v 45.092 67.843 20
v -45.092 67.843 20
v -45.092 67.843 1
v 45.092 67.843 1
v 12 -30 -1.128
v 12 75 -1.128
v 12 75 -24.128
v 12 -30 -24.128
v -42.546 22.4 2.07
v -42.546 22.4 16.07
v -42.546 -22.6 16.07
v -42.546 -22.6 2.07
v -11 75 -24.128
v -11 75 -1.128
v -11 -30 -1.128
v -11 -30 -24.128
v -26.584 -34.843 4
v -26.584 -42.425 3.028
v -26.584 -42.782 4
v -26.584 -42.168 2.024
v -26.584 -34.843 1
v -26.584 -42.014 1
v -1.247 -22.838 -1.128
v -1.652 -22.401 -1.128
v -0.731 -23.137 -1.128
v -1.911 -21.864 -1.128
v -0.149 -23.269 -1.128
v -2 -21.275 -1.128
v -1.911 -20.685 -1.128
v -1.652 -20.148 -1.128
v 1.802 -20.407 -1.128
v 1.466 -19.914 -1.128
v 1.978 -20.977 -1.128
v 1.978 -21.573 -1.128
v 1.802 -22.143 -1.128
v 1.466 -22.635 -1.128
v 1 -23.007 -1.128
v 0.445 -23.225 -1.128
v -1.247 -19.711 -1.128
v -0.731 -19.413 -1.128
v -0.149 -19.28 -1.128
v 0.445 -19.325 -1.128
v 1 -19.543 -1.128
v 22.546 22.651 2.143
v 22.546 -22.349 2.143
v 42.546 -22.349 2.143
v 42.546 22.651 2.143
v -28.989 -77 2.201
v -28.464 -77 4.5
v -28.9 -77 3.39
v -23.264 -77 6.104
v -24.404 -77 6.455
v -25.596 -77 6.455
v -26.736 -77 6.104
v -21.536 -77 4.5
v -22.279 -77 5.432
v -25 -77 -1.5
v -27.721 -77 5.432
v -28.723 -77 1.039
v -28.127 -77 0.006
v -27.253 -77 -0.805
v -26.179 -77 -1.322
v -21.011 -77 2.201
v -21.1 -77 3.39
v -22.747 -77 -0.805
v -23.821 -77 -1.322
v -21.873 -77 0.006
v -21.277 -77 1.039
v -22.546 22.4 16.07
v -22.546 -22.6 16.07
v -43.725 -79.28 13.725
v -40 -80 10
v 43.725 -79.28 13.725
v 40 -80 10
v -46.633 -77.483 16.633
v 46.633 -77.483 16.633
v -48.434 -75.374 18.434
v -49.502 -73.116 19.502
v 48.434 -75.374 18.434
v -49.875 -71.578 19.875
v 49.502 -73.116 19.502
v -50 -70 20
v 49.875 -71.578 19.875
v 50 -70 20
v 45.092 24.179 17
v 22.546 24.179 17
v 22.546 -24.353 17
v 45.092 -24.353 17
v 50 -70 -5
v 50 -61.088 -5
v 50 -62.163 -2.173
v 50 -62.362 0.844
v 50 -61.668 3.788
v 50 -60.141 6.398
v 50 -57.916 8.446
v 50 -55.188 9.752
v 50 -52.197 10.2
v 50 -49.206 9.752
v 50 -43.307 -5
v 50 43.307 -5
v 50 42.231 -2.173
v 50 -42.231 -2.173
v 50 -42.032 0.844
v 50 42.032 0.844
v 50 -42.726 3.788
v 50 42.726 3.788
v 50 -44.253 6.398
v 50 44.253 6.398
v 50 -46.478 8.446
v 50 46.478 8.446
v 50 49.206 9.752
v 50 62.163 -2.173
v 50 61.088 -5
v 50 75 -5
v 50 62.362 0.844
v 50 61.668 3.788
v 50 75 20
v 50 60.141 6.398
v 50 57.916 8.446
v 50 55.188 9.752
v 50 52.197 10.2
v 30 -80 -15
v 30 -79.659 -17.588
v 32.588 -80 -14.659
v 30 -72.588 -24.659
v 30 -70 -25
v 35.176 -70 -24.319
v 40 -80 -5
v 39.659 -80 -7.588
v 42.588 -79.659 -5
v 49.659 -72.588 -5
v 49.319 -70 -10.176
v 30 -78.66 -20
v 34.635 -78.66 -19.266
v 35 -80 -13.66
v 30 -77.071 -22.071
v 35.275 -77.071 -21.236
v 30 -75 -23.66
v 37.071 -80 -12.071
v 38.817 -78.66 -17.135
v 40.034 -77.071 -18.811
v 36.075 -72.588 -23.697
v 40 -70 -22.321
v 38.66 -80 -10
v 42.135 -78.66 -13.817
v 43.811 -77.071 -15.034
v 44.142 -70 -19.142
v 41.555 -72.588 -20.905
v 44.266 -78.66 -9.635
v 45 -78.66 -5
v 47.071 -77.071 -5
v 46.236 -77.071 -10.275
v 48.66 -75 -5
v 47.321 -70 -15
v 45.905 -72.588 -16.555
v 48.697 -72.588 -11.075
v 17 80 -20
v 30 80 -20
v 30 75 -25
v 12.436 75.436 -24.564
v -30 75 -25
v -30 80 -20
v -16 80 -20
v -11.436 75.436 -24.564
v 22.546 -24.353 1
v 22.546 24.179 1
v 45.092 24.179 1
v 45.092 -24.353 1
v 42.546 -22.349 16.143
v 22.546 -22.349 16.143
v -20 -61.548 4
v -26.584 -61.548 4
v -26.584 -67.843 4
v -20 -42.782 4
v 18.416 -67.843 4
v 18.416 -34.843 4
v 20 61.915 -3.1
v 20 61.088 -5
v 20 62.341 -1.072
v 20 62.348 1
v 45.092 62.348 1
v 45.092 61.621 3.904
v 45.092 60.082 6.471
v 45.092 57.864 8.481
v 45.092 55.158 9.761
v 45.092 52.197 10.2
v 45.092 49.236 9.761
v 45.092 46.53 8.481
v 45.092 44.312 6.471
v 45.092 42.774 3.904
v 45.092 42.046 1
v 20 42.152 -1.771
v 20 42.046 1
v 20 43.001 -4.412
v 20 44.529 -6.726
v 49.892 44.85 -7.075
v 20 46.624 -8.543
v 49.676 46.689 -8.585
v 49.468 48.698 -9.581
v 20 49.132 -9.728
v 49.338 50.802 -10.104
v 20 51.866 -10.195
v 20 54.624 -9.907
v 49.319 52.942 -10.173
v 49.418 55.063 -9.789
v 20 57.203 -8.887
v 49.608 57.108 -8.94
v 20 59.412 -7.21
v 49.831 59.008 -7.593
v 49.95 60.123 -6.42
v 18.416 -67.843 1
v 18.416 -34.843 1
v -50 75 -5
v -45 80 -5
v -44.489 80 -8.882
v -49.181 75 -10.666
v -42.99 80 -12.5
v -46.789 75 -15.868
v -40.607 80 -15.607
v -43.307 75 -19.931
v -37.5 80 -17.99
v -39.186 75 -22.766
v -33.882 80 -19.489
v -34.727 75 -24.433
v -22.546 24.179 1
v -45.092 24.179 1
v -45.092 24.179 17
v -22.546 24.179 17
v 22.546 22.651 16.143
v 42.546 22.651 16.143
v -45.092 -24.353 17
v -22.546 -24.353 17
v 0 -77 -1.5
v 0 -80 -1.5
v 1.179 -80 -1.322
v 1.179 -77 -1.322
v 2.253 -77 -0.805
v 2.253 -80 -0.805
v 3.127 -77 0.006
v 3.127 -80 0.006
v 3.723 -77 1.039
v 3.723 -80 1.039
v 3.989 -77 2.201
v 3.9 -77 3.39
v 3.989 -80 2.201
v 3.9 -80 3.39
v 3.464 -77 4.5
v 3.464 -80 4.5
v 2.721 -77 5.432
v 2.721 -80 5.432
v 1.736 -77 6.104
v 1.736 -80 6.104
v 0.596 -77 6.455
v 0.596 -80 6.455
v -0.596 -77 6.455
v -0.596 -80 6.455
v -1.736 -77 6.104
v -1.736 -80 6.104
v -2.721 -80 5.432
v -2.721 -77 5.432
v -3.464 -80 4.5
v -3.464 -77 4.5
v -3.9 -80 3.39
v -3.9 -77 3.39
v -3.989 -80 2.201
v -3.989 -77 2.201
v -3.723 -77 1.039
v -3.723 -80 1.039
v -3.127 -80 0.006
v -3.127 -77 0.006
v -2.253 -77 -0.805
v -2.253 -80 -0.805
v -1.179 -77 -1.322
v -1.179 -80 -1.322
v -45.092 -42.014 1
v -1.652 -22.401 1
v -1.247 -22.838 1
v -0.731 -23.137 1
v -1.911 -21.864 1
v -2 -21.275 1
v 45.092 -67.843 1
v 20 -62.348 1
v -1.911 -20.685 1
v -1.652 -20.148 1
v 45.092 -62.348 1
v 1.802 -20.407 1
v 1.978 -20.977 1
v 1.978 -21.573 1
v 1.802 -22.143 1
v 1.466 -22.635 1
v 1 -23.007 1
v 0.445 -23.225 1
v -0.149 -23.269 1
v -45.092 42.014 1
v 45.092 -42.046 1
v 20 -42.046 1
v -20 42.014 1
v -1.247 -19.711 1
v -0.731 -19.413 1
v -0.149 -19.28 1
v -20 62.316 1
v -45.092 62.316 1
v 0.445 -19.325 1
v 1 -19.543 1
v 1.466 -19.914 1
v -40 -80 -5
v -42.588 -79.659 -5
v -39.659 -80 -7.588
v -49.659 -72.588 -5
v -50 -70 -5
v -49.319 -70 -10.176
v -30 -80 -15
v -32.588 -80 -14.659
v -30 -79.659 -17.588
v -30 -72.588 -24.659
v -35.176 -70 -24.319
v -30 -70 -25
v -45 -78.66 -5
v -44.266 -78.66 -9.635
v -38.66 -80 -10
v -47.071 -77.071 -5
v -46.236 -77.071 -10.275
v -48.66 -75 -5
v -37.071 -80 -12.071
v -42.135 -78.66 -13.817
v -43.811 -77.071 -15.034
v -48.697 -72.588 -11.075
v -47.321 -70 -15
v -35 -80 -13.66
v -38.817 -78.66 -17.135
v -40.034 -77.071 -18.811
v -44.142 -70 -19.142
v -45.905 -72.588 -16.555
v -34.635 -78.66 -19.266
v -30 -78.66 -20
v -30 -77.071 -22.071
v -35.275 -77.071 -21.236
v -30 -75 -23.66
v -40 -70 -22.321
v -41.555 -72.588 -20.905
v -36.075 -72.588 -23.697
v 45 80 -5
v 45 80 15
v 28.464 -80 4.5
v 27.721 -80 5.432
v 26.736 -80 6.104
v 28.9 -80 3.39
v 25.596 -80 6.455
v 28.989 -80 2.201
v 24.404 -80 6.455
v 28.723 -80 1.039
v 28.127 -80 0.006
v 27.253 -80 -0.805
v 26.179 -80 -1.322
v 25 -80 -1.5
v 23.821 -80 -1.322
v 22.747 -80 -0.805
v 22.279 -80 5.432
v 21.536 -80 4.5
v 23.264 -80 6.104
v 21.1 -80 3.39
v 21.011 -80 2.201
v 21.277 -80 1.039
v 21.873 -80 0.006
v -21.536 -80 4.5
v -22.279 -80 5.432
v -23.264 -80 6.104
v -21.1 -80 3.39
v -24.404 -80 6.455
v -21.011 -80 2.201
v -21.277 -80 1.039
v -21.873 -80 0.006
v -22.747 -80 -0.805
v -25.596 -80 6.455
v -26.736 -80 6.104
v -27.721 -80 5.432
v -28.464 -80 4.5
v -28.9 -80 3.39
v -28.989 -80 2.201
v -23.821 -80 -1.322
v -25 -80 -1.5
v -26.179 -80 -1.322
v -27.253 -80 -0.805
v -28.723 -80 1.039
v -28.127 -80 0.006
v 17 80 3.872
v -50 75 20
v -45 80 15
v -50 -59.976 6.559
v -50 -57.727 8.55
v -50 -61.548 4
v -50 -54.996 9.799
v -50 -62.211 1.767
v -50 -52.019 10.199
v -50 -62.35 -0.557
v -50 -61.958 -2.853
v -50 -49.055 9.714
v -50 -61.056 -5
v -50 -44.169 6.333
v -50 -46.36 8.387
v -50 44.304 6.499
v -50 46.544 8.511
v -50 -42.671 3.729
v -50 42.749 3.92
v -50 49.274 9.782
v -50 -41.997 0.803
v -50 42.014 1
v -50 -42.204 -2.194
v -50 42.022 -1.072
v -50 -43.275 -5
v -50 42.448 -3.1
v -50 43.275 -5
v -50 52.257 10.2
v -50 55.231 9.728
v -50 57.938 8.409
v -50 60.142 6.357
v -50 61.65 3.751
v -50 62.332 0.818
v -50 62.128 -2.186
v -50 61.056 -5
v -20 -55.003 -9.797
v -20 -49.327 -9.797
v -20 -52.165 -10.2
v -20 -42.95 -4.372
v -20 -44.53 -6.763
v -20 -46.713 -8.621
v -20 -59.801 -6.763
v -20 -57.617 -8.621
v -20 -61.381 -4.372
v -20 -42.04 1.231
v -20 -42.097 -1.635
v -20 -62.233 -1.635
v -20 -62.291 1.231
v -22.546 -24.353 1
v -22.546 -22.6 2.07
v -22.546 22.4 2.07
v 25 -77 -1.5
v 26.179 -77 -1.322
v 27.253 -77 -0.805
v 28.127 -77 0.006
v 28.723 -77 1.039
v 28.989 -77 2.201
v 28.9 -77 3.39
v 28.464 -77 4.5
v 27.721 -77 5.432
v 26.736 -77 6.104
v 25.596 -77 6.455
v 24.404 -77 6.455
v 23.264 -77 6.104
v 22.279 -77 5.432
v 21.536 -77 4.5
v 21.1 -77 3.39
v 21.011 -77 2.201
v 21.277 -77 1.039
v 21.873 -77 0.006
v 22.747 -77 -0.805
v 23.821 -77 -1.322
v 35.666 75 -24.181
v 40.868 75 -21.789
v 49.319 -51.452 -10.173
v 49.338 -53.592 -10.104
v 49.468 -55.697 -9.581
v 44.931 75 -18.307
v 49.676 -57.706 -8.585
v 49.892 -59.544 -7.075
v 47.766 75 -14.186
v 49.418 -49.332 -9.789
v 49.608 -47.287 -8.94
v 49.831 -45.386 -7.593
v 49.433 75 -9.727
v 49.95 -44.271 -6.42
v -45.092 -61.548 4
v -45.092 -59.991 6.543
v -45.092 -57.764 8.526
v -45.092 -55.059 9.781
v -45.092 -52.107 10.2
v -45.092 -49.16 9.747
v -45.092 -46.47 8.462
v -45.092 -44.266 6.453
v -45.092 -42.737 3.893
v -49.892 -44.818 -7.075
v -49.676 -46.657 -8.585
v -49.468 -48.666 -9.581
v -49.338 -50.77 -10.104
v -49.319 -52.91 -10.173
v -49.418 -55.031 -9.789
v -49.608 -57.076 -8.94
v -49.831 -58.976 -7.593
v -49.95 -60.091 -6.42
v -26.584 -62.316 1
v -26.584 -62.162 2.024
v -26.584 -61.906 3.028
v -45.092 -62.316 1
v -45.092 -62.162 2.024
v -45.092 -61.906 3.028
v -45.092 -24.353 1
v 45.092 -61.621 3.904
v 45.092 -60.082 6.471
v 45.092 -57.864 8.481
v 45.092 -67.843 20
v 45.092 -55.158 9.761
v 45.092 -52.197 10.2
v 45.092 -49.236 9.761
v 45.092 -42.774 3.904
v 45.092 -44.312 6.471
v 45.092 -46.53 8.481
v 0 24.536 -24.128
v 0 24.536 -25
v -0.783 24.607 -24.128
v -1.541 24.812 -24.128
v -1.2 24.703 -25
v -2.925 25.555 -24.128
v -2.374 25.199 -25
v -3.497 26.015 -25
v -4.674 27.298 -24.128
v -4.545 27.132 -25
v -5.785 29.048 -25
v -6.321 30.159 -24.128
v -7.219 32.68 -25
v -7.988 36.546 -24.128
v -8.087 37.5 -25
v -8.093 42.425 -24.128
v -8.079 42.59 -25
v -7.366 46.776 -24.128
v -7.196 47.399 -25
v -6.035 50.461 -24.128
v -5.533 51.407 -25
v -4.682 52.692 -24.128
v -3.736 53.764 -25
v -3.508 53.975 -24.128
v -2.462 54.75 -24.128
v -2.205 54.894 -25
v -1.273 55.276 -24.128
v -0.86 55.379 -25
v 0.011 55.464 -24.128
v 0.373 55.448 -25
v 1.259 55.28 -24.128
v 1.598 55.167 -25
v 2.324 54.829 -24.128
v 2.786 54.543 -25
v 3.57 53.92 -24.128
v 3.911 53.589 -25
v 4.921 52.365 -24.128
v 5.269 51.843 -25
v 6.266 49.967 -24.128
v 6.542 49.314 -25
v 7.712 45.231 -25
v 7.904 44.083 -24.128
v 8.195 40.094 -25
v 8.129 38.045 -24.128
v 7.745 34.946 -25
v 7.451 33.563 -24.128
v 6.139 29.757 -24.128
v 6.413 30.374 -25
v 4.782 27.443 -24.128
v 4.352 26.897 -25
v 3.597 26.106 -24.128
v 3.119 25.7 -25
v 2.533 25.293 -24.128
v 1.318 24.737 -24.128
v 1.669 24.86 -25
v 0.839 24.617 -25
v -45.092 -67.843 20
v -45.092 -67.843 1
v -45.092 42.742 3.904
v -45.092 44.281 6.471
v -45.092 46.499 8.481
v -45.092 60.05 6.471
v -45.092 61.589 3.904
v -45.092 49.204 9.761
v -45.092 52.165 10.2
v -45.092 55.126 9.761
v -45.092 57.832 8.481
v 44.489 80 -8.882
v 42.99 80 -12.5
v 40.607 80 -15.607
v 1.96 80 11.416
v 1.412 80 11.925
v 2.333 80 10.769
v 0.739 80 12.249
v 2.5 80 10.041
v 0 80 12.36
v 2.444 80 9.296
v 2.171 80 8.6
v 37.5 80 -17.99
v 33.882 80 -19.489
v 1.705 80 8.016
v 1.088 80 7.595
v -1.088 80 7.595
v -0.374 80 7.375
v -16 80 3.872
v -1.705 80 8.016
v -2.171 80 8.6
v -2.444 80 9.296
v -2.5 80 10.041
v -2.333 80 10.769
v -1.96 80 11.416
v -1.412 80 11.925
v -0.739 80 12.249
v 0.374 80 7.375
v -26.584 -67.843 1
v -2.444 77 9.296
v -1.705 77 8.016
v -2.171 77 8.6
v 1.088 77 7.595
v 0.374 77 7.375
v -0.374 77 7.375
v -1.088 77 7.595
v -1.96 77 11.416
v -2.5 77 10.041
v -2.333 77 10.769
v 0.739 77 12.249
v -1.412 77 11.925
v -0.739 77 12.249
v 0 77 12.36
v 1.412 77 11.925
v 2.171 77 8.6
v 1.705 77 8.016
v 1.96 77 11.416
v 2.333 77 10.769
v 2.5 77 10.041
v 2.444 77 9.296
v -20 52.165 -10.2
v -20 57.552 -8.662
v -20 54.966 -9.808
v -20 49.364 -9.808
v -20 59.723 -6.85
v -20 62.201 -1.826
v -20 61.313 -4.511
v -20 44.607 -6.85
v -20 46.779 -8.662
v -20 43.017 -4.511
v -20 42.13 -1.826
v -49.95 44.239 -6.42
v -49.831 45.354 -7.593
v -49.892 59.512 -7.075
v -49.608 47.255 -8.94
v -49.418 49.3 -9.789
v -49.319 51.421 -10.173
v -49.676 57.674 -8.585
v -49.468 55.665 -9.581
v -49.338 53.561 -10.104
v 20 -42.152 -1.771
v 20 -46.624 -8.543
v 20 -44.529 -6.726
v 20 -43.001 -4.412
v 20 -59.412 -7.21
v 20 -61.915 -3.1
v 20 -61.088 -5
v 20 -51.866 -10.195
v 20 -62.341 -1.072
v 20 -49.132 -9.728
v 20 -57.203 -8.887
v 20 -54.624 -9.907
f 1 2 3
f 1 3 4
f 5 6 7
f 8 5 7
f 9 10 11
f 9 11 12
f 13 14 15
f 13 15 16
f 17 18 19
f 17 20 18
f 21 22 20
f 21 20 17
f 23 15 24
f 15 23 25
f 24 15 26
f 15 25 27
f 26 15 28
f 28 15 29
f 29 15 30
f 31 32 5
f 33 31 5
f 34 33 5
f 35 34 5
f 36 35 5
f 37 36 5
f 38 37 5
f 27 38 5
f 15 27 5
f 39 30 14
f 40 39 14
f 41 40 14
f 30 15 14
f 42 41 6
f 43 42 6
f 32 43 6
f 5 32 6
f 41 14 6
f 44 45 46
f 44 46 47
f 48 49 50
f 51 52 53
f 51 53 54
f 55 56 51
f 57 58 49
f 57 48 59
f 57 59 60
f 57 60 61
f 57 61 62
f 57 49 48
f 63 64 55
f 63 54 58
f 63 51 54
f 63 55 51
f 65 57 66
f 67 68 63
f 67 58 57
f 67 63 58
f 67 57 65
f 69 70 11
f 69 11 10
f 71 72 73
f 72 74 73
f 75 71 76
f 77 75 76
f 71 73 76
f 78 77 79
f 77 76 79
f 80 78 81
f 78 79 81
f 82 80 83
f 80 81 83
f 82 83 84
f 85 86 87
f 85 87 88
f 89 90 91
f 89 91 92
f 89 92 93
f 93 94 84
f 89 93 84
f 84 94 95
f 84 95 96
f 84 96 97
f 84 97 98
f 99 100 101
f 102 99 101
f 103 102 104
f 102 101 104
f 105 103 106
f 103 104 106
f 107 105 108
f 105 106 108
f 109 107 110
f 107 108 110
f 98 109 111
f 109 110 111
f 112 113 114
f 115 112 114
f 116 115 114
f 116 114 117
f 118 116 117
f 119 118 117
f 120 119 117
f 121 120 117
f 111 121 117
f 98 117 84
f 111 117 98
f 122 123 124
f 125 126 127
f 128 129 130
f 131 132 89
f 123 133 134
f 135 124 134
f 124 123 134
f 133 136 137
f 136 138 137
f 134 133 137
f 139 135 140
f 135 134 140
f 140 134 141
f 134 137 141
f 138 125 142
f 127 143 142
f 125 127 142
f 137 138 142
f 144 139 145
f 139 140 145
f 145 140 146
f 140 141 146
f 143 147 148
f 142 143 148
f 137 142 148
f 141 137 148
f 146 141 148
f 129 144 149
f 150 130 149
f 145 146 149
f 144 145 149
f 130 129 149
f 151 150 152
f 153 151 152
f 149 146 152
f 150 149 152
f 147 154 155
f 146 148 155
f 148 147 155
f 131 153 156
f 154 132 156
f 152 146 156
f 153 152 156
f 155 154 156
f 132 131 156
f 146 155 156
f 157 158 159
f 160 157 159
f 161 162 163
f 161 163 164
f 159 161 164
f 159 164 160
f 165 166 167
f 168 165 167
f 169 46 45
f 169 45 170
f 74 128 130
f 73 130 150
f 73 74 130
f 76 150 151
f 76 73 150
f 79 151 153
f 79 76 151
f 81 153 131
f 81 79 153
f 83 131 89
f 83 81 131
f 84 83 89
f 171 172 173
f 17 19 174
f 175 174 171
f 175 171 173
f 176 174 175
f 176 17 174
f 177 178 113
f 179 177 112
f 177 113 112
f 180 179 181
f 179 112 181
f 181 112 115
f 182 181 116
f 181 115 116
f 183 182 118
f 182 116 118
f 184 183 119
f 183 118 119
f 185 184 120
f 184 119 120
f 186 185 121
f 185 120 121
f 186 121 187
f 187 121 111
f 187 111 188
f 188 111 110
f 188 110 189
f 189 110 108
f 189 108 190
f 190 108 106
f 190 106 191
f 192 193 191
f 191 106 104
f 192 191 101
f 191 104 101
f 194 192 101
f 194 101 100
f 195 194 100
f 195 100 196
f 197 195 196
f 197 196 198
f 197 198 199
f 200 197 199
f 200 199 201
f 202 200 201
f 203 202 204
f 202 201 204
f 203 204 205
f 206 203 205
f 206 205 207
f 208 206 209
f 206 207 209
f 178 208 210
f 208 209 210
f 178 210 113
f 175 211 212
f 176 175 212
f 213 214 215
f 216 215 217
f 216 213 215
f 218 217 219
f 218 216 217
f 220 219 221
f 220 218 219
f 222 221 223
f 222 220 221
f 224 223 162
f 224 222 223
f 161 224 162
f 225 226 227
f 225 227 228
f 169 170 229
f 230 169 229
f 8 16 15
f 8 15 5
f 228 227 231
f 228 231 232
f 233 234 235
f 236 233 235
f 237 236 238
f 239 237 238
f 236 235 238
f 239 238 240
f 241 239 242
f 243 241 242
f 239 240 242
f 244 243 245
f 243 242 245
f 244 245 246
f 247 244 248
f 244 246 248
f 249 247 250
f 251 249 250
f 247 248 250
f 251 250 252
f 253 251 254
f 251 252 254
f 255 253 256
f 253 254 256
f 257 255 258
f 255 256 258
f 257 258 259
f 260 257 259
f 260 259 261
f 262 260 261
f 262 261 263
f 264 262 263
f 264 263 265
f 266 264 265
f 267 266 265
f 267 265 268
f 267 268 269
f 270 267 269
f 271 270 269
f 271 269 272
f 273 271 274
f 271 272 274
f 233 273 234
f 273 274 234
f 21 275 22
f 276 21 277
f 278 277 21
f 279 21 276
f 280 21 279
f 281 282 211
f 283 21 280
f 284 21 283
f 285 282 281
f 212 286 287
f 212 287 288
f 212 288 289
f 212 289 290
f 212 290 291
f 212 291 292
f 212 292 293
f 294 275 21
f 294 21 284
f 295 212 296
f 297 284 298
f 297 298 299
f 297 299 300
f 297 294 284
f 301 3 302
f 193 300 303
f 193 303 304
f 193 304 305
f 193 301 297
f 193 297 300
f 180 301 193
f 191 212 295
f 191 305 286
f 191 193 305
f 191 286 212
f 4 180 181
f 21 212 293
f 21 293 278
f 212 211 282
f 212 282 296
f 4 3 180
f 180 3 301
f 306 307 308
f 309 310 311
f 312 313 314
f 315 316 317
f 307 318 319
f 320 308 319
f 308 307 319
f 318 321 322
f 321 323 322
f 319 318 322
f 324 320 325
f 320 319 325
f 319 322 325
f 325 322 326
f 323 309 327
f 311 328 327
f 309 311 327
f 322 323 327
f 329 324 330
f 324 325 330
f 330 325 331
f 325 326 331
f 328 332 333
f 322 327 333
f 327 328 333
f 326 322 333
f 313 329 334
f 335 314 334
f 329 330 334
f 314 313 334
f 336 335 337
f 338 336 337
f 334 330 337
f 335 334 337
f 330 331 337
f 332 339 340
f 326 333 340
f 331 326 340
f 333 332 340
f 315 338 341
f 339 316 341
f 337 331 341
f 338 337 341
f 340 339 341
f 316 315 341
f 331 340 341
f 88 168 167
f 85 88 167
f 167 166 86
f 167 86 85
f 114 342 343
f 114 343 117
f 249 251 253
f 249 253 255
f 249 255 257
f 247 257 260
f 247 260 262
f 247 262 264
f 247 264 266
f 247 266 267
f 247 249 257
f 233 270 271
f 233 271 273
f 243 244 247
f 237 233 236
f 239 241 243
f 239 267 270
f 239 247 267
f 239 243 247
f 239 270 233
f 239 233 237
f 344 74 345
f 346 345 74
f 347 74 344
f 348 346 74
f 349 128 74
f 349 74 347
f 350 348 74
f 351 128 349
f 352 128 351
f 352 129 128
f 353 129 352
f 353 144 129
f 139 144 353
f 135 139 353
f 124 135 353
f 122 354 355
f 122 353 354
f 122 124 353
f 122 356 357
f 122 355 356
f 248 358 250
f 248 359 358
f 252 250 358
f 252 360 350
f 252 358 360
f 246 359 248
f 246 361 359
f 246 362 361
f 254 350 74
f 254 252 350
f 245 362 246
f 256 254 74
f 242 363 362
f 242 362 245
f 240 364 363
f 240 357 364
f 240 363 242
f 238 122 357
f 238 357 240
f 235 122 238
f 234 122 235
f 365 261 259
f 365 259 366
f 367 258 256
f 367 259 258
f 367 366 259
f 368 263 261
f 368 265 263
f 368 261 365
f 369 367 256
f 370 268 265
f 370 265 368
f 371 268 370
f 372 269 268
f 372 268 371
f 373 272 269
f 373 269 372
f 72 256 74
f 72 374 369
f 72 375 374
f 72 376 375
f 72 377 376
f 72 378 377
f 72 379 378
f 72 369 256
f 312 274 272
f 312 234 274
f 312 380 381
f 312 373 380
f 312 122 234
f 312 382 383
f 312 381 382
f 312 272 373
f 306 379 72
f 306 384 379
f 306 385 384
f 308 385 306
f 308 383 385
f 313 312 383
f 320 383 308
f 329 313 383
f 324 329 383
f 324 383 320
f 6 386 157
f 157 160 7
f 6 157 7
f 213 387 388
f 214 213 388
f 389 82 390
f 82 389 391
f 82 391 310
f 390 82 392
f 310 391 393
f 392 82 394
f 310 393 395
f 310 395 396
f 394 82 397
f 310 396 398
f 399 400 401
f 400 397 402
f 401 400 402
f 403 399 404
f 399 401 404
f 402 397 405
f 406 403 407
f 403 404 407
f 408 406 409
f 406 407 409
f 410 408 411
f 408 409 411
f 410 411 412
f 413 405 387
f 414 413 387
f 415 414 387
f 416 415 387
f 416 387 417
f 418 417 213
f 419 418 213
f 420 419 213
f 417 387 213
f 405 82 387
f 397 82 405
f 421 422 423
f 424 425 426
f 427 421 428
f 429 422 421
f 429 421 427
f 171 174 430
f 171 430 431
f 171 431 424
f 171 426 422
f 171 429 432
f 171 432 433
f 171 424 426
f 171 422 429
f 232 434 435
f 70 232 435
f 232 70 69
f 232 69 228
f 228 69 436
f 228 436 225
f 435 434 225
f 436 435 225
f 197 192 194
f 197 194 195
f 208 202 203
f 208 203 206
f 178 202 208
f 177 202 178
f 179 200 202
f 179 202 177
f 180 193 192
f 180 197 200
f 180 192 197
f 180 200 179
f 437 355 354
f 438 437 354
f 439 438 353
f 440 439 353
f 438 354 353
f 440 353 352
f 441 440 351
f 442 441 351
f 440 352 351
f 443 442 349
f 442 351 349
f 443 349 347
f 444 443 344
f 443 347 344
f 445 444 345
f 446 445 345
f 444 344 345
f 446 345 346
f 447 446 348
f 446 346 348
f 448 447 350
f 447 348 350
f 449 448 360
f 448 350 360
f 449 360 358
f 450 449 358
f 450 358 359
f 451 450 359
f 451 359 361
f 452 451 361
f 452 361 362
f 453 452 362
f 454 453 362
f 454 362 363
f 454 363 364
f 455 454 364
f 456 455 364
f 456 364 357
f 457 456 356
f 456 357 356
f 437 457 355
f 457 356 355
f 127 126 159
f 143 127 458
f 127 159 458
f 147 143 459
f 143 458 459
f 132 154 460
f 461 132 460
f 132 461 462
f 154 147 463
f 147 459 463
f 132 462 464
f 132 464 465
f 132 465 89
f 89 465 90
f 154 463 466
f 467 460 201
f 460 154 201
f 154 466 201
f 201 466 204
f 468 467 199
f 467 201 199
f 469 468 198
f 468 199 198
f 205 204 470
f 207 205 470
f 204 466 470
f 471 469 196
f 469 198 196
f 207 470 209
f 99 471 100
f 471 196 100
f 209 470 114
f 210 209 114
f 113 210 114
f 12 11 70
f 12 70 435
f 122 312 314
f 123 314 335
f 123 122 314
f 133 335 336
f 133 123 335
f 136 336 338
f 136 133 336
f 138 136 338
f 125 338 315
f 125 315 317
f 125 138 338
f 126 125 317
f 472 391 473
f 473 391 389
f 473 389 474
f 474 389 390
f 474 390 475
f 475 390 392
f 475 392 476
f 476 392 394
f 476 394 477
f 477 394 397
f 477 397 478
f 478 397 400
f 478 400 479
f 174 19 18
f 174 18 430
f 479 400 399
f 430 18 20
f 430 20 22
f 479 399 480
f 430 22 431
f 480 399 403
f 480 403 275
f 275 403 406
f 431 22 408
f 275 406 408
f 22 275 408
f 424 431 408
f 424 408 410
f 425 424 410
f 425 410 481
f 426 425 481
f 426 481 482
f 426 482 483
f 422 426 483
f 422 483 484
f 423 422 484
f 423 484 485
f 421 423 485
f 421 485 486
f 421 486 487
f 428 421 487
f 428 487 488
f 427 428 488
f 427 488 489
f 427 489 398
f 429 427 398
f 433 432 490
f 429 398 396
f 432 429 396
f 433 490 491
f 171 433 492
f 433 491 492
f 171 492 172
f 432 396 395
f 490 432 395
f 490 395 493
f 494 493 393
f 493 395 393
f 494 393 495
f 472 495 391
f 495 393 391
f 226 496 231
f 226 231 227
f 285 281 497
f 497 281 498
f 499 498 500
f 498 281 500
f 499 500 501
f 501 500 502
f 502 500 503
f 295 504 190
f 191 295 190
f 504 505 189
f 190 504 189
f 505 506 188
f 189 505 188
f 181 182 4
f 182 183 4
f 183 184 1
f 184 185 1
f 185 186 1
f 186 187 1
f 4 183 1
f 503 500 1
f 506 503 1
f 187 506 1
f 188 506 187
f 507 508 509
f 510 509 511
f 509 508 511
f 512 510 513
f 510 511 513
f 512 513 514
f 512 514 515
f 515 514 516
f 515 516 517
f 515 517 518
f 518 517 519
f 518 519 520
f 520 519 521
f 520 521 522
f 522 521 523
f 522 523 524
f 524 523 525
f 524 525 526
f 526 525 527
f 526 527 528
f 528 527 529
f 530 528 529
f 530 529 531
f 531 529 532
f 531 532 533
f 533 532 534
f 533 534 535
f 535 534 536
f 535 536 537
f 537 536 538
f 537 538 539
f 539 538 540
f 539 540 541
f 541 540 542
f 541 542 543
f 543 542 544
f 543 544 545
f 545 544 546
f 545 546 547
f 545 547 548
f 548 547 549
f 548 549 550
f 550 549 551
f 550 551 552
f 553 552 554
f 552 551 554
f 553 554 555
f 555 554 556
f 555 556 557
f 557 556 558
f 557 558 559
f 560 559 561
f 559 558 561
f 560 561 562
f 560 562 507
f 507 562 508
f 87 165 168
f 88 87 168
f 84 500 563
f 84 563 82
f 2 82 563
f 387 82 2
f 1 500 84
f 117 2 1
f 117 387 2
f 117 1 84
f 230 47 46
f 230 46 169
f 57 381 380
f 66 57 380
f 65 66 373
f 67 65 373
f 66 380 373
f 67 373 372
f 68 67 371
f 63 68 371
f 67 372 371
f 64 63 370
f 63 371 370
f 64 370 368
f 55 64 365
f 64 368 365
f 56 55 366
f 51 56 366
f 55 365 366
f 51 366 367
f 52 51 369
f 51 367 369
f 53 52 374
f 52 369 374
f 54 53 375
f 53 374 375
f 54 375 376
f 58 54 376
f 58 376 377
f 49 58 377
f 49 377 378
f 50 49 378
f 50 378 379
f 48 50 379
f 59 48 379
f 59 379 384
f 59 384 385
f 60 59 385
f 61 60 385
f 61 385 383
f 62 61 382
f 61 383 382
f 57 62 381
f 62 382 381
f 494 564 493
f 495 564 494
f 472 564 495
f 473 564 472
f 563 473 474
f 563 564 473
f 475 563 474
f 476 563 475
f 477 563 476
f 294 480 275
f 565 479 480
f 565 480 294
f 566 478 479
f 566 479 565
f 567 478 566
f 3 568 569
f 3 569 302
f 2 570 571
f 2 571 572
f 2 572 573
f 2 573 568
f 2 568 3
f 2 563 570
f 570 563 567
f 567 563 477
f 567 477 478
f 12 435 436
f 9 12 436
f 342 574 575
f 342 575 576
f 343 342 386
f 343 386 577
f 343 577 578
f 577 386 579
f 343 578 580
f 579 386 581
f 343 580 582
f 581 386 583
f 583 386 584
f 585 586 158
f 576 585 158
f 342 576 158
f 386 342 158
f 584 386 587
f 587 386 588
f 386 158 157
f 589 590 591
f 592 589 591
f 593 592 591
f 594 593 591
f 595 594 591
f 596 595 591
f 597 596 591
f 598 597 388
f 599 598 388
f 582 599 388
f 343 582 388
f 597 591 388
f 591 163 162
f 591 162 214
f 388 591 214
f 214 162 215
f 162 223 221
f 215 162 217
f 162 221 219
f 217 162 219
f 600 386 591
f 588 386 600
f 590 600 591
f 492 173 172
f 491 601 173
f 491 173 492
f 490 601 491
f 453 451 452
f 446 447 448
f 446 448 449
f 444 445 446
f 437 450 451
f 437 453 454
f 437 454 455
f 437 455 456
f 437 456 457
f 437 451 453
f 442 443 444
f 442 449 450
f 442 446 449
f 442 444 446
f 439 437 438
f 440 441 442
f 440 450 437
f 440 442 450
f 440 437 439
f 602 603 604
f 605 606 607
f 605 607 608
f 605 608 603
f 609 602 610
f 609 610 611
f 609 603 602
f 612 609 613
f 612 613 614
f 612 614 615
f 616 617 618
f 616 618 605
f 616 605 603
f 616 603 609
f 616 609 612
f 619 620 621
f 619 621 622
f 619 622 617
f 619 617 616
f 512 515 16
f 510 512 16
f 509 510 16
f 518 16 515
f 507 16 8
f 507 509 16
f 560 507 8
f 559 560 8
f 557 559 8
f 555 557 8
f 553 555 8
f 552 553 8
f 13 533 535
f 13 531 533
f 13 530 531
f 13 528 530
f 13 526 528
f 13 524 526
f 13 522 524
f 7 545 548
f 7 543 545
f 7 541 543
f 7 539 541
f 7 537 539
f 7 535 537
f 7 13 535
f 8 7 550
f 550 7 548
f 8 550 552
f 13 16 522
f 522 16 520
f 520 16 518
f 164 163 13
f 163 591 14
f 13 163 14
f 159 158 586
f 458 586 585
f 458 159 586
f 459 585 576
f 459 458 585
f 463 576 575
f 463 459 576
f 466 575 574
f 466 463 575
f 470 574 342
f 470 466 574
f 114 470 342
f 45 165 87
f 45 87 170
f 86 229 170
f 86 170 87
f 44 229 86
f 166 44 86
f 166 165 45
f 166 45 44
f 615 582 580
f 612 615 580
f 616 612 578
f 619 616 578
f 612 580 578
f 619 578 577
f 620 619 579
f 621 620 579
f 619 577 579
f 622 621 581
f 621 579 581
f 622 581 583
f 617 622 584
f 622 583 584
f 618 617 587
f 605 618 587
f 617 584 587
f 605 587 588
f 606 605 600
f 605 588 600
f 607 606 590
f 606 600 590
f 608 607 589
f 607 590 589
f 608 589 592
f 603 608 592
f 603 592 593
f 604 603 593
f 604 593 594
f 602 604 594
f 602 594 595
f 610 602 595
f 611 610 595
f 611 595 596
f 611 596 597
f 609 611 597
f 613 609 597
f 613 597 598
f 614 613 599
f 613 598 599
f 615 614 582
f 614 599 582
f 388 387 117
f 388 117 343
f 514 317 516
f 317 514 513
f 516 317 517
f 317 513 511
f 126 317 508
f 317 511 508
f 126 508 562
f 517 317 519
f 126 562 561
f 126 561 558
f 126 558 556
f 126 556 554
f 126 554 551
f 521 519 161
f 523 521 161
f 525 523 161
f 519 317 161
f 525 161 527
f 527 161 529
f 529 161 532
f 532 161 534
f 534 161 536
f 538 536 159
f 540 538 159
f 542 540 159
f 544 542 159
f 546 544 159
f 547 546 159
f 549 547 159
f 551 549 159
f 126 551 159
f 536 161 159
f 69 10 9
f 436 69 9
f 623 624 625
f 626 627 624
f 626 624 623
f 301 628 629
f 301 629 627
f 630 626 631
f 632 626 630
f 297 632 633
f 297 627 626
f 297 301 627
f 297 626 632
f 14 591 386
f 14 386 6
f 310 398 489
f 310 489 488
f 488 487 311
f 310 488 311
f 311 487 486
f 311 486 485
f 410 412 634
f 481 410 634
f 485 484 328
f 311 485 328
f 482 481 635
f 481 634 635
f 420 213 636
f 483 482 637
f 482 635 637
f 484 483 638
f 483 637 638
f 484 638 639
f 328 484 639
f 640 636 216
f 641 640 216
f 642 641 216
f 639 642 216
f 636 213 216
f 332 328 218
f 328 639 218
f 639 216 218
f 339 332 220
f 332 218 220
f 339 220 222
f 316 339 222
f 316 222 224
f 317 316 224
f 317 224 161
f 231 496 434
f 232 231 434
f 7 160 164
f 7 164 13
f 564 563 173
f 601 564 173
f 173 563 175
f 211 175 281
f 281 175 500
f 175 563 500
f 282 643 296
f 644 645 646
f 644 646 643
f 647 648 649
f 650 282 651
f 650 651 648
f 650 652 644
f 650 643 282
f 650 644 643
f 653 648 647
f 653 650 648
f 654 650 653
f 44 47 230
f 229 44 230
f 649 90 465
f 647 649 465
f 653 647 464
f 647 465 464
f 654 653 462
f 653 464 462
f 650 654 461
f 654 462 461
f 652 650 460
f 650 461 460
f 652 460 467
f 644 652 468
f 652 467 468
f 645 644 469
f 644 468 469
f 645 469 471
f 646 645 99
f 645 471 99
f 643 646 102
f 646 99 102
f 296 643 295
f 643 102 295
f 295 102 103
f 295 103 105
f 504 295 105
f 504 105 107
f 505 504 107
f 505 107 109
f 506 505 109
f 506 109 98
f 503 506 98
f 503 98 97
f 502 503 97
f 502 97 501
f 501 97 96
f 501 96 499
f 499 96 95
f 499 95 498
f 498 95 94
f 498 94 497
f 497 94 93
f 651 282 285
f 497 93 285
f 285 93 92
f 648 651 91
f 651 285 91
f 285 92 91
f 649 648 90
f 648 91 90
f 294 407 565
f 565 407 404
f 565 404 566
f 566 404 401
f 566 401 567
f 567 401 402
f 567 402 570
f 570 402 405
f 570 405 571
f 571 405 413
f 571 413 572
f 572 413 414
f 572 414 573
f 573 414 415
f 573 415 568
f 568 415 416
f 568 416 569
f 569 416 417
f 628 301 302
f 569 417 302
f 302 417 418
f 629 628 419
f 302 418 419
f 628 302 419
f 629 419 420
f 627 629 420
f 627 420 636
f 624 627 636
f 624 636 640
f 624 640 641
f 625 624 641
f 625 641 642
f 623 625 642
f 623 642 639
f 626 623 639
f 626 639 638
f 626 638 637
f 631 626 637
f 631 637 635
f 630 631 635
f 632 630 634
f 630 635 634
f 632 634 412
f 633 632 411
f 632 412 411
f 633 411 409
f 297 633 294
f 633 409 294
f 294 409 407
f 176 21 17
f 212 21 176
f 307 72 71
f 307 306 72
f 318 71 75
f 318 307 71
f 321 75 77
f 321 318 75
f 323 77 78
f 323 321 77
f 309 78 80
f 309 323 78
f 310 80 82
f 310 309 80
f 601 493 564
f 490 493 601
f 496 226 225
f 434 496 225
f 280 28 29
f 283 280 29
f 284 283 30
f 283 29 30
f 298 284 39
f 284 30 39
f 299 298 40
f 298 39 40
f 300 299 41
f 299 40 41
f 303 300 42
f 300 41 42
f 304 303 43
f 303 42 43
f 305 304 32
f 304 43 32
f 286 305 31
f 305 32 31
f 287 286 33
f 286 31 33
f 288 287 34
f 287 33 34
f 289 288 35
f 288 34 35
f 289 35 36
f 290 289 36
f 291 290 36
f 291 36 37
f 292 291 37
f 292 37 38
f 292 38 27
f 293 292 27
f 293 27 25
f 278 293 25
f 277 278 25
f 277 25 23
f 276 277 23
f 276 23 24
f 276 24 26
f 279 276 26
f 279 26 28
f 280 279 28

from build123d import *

# Parameters (mm, degrees)
SKETCH1_W             = 100
SKETCH1_H             = 160
BOSS_EXTRUDE1_DEPTH   = 20
BOSS_EXTRUDE2_DEPTH   = 160
FILLET4_R             = 10
SKETCH11_W            = 90.184018432
SKETCH11_H            = 135.686144012
CUT_EXTRUDE3_DEPTH    = 19
SKETCH12_W            = 23
SKETCH12_H            = 23
CUT_EXTRUDE4_DEPTH    = 110
SKETCH13_RX           = 15.4640355
SKETCH13_RY           = 8.1946903
CUT_EXTRUDE5_DEPTH    = 4
SKETCH15_R            = 2
CUT_EXTRUDE6_DEPTH    = 4
SKETCH22_W            = 22.546004608
SKETCH22_H            = 48.532413032
BOSS_EXTRUDE7_DEPTH   = 16
BOSS_EXTRUDE7_2_DEPTH = 16
SKETCH26_W            = 45
SKETCH26_H            = 33
BOSS_EXTRUDE8_DEPTH   = 3
SKETCH27_R            = 4
CUT_EXTRUDE13_DEPTH   = 3
SKETCH28_R            = 2.506731261
CUT_EXTRUDE14_DEPTH   = 3
SKETCH14_R            = 10.2
CUT_EXTRUDE15_DEPTH   = 30
SKETCH17_R            = 10.2
CUT_EXTRUDE16_DEPTH   = 30
SKETCH23_W            = 14
SKETCH23_H            = 45
CUT_EXTRUDE17_DEPTH   = 20
SKETCH24_W            = 14
SKETCH24_H            = 45
CUT_EXTRUDE18_DEPTH   = 20


with BuildPart() as part:
    # Sketch1 → Boss-Extrude1 (new body)
    with BuildSketch(Plane.XY):
        Rectangle(SKETCH1_W, SKETCH1_H)
    extrude(amount=BOSS_EXTRUDE1_DEPTH)

    # Sketch5 → Boss-Extrude2 (add)
    with BuildSketch(Plane(origin=(0, 80, 0), x_dir=(1, 0, 0), z_dir=(0, 1, 0))):
        with BuildLine():
            Line((50, 0), (-50, 0))
            Line((-50, 0), (-50, 5))
            ThreePointArc((-50, 5), (-44.142135624, 19.142135624), (-30, 25))
            Line((-30, 25), (30, 25))
            ThreePointArc((30, 25), (44.142135624, 19.142135624), (50, 5))
            Line((50, 5), (50, 0))
        make_face()
    extrude(amount=-BOSS_EXTRUDE2_DEPTH)

    # Fillet4
    fillet4_edges = [part.edges().sort_by_distance(p)[0] for p in [
        (-44.142135624, -80, -19.142135624),
        (0, -80, -25),
        (44.142135624, -80, -19.142135624),
        (0, -80, 20),
        (50, -80, 7.5),
        (-50, -80, 7.5),
    ]]
    fillet(fillet4_edges, radius=FILLET4_R)

    # Sketch11 → Cut-Extrude3 (cut)
    with BuildSketch(Plane.XY.offset(20)):
        Rectangle(SKETCH11_W, SKETCH11_H)
    extrude(amount=-CUT_EXTRUDE3_DEPTH, mode=Mode.SUBTRACT)

    # Sketch12 → Cut-Extrude4 (cut)
    with BuildSketch(Plane(origin=(0, 80, 0), x_dir=(1, 0, 0), z_dir=(0, 1, 0))):
        with Locations((0.5, 12.627685957)):
            Rectangle(SKETCH12_W, SKETCH12_H)
    extrude(amount=-CUT_EXTRUDE4_DEPTH, mode=Mode.SUBTRACT)

    # Sketch13 → Cut-Extrude5 (cut)
    with BuildSketch(Plane(origin=(0, 0, -25), x_dir=(-1, 0, 0), z_dir=(0, 0, -1))):
        with Locations(Location((0, 40), (0, 0, -90))):
            Ellipse(SKETCH13_RX, SKETCH13_RY)
    extrude(amount=-CUT_EXTRUDE5_DEPTH, mode=Mode.SUBTRACT)

    # Sketch15 → Cut-Extrude6 (cut)
    with BuildSketch(Plane(origin=(0, 0, -1.127685957), x_dir=(-1, 0, 0), z_dir=(0, 0, -1))):
        with Locations((0, -21.274761421)):
            Circle(SKETCH15_R)
    extrude(amount=-CUT_EXTRUDE6_DEPTH, mode=Mode.SUBTRACT)

    # Chamfer1
    # the kernel refuses this chamfer: 5 mm, written as the material it takes off along each edge
    with BuildSketch(Plane(origin=(30, 80, -5), x_dir=(0, 0, -1), z_dir=(-1, 0, 0))) as chamfer1_piece_1:
        with BuildLine():
            Line((14.858578644, -0.141421356), (20.141421356, 5.141421356))
            Line((20.141421356, 5.141421356), (20.241421356, 5.141421356))
            ThreePointArc((20.241421356, 5.141421356), (20.1, 2.570710678), (20.1, 0))
            Line((20.1, 0), (20, -0.1))
            ThreePointArc((20, -0.1), (17.429289322, -0.1), (14.858578644, -0.241421356))
            Line((14.858578644, -0.241421356), (14.858578644, -0.141421356))
        make_face()
    revolve(axis=Axis((30, 80, -5), (0, -1, 0)), revolution_arc=90, mode=Mode.SUBTRACT)
    with BuildSketch(Plane(origin=(-30, 80, -25), x_dir=(0, 0.0274958766105877, 0.9996219169112968), z_dir=(1, 0, 0))) as chamfer1_piece_2:
        with BuildLine():
            Line((5.143365976, 0), (-0.282735774, 5.135588968))
            Line((-0.282735774, 5.135588968), (-0.382697966, 5.13283938))
            ThreePointArc((-0.382697966, 5.13283938), (-0.170646135, 2.566989148), (-0.099962192, -0.002749588))
            Line((-0.099962192, -0.002749588), (0.002749588, -0.099962192))
            ThreePointArc((0.002749588, -0.099962192), (2.572488324, -0.029278248), (5.146115564, -0.099962192))
            Line((5.146115564, -0.099962192), (5.143365976, 0))
        make_face()
    extrude(amount=60, mode=Mode.SUBTRACT)
    with BuildSketch(Plane(origin=(-30, 80, -5), x_dir=(-1, 0, 0), z_dir=(0, 0, 1))) as chamfer1_piece_3:
        with BuildLine():
            Line((14.858578644, -0.141421356), (20.141421356, 5.141421356))
            Line((20.141421356, 5.141421356), (20.241421356, 5.141421356))
            ThreePointArc((20.241421356, 5.141421356), (20.1, 2.570710678), (20.1, 0))
            Line((20.1, 0), (20, -0.1))
            ThreePointArc((20, -0.1), (17.429289322, -0.1), (14.858578644, -0.241421356))
            Line((14.858578644, -0.241421356), (14.858578644, -0.141421356))
        make_face()
    revolve(axis=Axis((-30, 80, -5), (0, -1, 0)), revolution_arc=90, mode=Mode.SUBTRACT)
    with BuildSketch(Plane(origin=(12, 80, -1.127685957), x_dir=(0, 0.0274958766105877, 0.9996219169112968), z_dir=(-1, 0, 0)), Plane(origin=(-11, 80, -1.127685957), x_dir=(-0.9996219169112968, 0.0274958766105877, 0), z_dir=(0, 0, -1)), Plane(origin=(12, 80, -24.127685957), x_dir=(0.9996219169112965, 0.027495876610587732, 0), z_dir=(0, 0, 1)), Plane(origin=(-11, 80, -24.127685957), x_dir=(0, 0.0274958766105877, -0.9996219169112968), z_dir=(1, 0, 0))) as chamfer1_piece_4:
        with BuildLine():
            Line((5.143365976, 0), (-0.282735774, -5.135588968))
            Line((-0.282735774, -5.135588968), (-0.382697966, -5.13283938))
            ThreePointArc((-0.382697966, -5.13283938), (-0.170646135, -2.566989148), (-0.099962192, 0.002749588))
            Line((-0.099962192, 0.002749588), (0.002749588, 0.099962192))
            ThreePointArc((0.002749588, 0.099962192), (2.572488324, 0.029278248), (5.146115564, 0.099962192))
            Line((5.146115564, 0.099962192), (5.143365976, 0))
        make_face()
    extrude(amount=23, mode=Mode.SUBTRACT)
    with BuildSketch(Plane(origin=(-50, 80, -5), x_dir=(-0.027495876610586282, -0.9996219169112968, 0), z_dir=(0, 0, 1))) as chamfer1_piece_5:
        with BuildLine():
            Line((5.143365976, 0), (-0.282735774, 5.135588968))
            Line((-0.282735774, 5.135588968), (-0.382697966, 5.13283938))
            ThreePointArc((-0.382697966, 5.13283938), (-0.170646135, 2.566989148), (-0.099962192, -0.002749588))
            Line((-0.099962192, -0.002749588), (0.002749588, -0.099962192))
            ThreePointArc((0.002749588, -0.099962192), (2.572488324, -0.029278248), (5.146115564, -0.099962192))
            Line((5.146115564, -0.099962192), (5.143365976, 0))
        make_face()
    extrude(amount=25, mode=Mode.SUBTRACT)
    with BuildSketch(Plane(origin=(50, 80, 20), x_dir=(-0.9996219169112968, 0.0274958766105877, 0), z_dir=(0, 0, -1))) as chamfer1_piece_6:
        with BuildLine():
            Line((5.143365976, 0), (-0.282735774, -5.135588968))
            Line((-0.282735774, -5.135588968), (-0.382697966, -5.13283938))
            ThreePointArc((-0.382697966, -5.13283938), (-0.170646135, -2.566989148), (-0.099962192, 0.002749588))
            Line((-0.099962192, 0.002749588), (0.002749588, 0.099962192))
            ThreePointArc((0.002749588, 0.099962192), (2.572488324, 0.029278248), (5.146115564, 0.099962192))
            Line((5.146115564, 0.099962192), (5.143365976, 0))
        make_face()
    extrude(amount=25, mode=Mode.SUBTRACT)
    with BuildSketch(Plane(origin=(-50, 80, 20), x_dir=(0, -0.9996219169112968, 0.027495876610586282), z_dir=(1, 0, 0))) as chamfer1_piece_7:
        with BuildLine():
            Line((5.143365976, 0), (-0.282735774, 5.135588968))
            Line((-0.282735774, 5.135588968), (-0.382697966, 5.13283938))
            ThreePointArc((-0.382697966, 5.13283938), (-0.170646135, 2.566989148), (-0.099962192, -0.002749588))
            Line((-0.099962192, -0.002749588), (0.002749588, -0.099962192))
            ThreePointArc((0.002749588, -0.099962192), (2.572488324, -0.029278248), (5.146115564, -0.099962192))
            Line((5.146115564, -0.099962192), (5.143365976, 0))
        make_face()
    extrude(amount=100, mode=Mode.SUBTRACT)
    with BuildSketch(Plane(origin=(12, 80, -24.127685957), x_dir=(0.9996219169112965, 0.027495876610587732, 0), z_dir=(0, 0, 1))) as chamfer1_piece_8a_section:
        with BuildLine():
            Line((5.143365976, 0), (-0.282735774, -5.135588968))
            Line((-0.282735774, -5.135588968), (-0.382697966, -5.13283938))
            ThreePointArc((-0.382697966, -5.13283938), (-0.170646135, -2.566989148), (-0.099962192, 0.002749588))
            Line((-0.099962192, 0.002749588), (0.002749588, 0.099962192))
            ThreePointArc((0.002749588, 0.099962192), (2.572488324, 0.029278248), (5.146115564, 0.099962192))
            Line((5.146115564, 0.099962192), (5.143365976, 0))
        make_face()
    chamfer1_piece_8a = extrude(amount=35.85841494, mode=Mode.PRIVATE)
    chamfer1_piece_8a = split(chamfer1_piece_8a, bisect_by=Plane(origin=(13.648968134, 78.351031866, -1.127685957), z_dir=(0, 0, 1)), keep=Keep.TOP, mode=Mode.PRIVATE)
    with BuildSketch(Plane(origin=(24.85841494, 80, -1.127685957), x_dir=(0, 0.0274958766105877, 0.9996219169112968), z_dir=(-1, 0, 0))) as chamfer1_piece_8b_section:
        with BuildLine():
            Line((5.143365976, 0), (-0.282735774, -5.135588968))
            Line((-0.282735774, -5.135588968), (-0.382697966, -5.13283938))
            ThreePointArc((-0.382697966, -5.13283938), (-0.170646135, -2.566989148), (-0.099962192, 0.002749588))
            Line((-0.099962192, 0.002749588), (0.002749588, 0.099962192))
            ThreePointArc((0.002749588, 0.099962192), (2.572488324, 0.029278248), (5.146115564, 0.099962192))
            Line((5.146115564, 0.099962192), (5.143365976, 0))
        make_face()
    chamfer1_piece_8b = extrude(amount=35.85841494, mode=Mode.PRIVATE)
    chamfer1_piece_8b = split(chamfer1_piece_8b, bisect_by=Plane(origin=(12, 78.351031866, 0.521282178), z_dir=(1, 0, 0)), keep=Keep.TOP, mode=Mode.PRIVATE)
    chamfer1_piece_8 = chamfer1_piece_8a & chamfer1_piece_8b
    add(chamfer1_piece_8, mode=Mode.SUBTRACT)
    with BuildSketch(Plane(origin=(-11, 80, 11.730728983), x_dir=(-0.9996219169112968, 0.0274958766105877, 0), z_dir=(0, 0, -1))) as chamfer1_piece_9a_section:
        with BuildLine():
            Line((5.143365976, 0), (-0.282735774, -5.135588968))
            Line((-0.282735774, -5.135588968), (-0.382697966, -5.13283938))
            ThreePointArc((-0.382697966, -5.13283938), (-0.170646135, -2.566989148), (-0.099962192, 0.002749588))
            Line((-0.099962192, 0.002749588), (0.002749588, 0.099962192))
            ThreePointArc((0.002749588, 0.099962192), (2.572488324, 0.029278248), (5.146115564, 0.099962192))
            Line((5.146115564, 0.099962192), (5.143365976, 0))
        make_face()
    chamfer1_piece_9a = extrude(amount=35.85841494, mode=Mode.PRIVATE)
    chamfer1_piece_9a = split(chamfer1_piece_9a, bisect_by=Plane(origin=(-12.648968134, 78.351031866, -1.127685957), z_dir=(0, 0, 1)), keep=Keep.TOP, mode=Mode.PRIVATE)
    with BuildSketch(Plane(origin=(12, 80, -1.127685957), x_dir=(0, 0.0274958766105877, 0.9996219169112968), z_dir=(-1, 0, 0))) as chamfer1_piece_9b_section:
        with BuildLine():
            Line((5.143365976, 0), (-0.282735774, -5.135588968))
            Line((-0.282735774, -5.135588968), (-0.382697966, -5.13283938))
            ThreePointArc((-0.382697966, -5.13283938), (-0.170646135, -2.566989148), (-0.099962192, 0.002749588))
            Line((-0.099962192, 0.002749588), (0.002749588, 0.099962192))
            ThreePointArc((0.002749588, 0.099962192), (2.572488324, 0.029278248), (5.146115564, 0.099962192))
            Line((5.146115564, 0.099962192), (5.143365976, 0))
        make_face()
    chamfer1_piece_9b = extrude(amount=35.85841494, mode=Mode.PRIVATE)
    chamfer1_piece_9b = split(chamfer1_piece_9b, bisect_by=Plane(origin=(-11, 78.351031866, 0.521282178), z_dir=(-1, 0, 0)), keep=Keep.TOP, mode=Mode.PRIVATE)
    chamfer1_piece_9 = chamfer1_piece_9a & chamfer1_piece_9b
    add(chamfer1_piece_9, mode=Mode.SUBTRACT)
    with BuildSketch(Plane(origin=(-23.85841494, 80, -24.127685957), x_dir=(0, 0.0274958766105877, -0.9996219169112968), z_dir=(1, 0, 0))) as chamfer1_piece_10a_section:
        with BuildLine():
            Line((5.143365976, 0), (-0.282735774, -5.135588968))
            Line((-0.282735774, -5.135588968), (-0.382697966, -5.13283938))
            ThreePointArc((-0.382697966, -5.13283938), (-0.170646135, -2.566989148), (-0.099962192, 0.002749588))
            Line((-0.099962192, 0.002749588), (0.002749588, 0.099962192))
            ThreePointArc((0.002749588, 0.099962192), (2.572488324, 0.029278248), (5.146115564, 0.099962192))
            Line((5.146115564, 0.099962192), (5.143365976, 0))
        make_face()
    chamfer1_piece_10a = extrude(amount=35.85841494, mode=Mode.PRIVATE)
    chamfer1_piece_10a = split(chamfer1_piece_10a, bisect_by=Plane(origin=(-11, 78.351031866, -25.776654091), z_dir=(-1, 0, 0)), keep=Keep.TOP, mode=Mode.PRIVATE)
    with BuildSketch(Plane(origin=(-11, 80, -1.127685957), x_dir=(-0.9996219169112968, 0.0274958766105877, 0), z_dir=(0, 0, -1))) as chamfer1_piece_10b_section:
        with BuildLine():
            Line((5.143365976, 0), (-0.282735774, -5.135588968))
            Line((-0.282735774, -5.135588968), (-0.382697966, -5.13283938))
            ThreePointArc((-0.382697966, -5.13283938), (-0.170646135, -2.566989148), (-0.099962192, 0.002749588))
            Line((-0.099962192, 0.002749588), (0.002749588, 0.099962192))
            ThreePointArc((0.002749588, 0.099962192), (2.572488324, 0.029278248), (5.146115564, 0.099962192))
            Line((5.146115564, 0.099962192), (5.143365976, 0))
        make_face()
    chamfer1_piece_10b = extrude(amount=35.85841494, mode=Mode.PRIVATE)
    chamfer1_piece_10b = split(chamfer1_piece_10b, bisect_by=Plane(origin=(-12.648968134, 78.351031866, -24.127685957), z_dir=(0, 0, -1)), keep=Keep.TOP, mode=Mode.PRIVATE)
    chamfer1_piece_10 = chamfer1_piece_10a & chamfer1_piece_10b
    add(chamfer1_piece_10, mode=Mode.SUBTRACT)
    with BuildSketch(Plane(origin=(12, 80, -36.986100896), x_dir=(0.9996219169112965, 0.027495876610587732, 0), z_dir=(0, 0, 1))) as chamfer1_piece_11a_section:
        with BuildLine():
            Line((5.143365976, 0), (-0.282735774, -5.135588968))
            Line((-0.282735774, -5.135588968), (-0.382697966, -5.13283938))
            ThreePointArc((-0.382697966, -5.13283938), (-0.170646135, -2.566989148), (-0.099962192, 0.002749588))
            Line((-0.099962192, 0.002749588), (0.002749588, 0.099962192))
            ThreePointArc((0.002749588, 0.099962192), (2.572488324, 0.029278248), (5.146115564, 0.099962192))
            Line((5.146115564, 0.099962192), (5.143365976, 0))
        make_face()
    chamfer1_piece_11a = extrude(amount=35.85841494, mode=Mode.PRIVATE)
    chamfer1_piece_11a = split(chamfer1_piece_11a, bisect_by=Plane(origin=(13.648968134, 78.351031866, -24.127685957), z_dir=(0, 0, -1)), keep=Keep.TOP, mode=Mode.PRIVATE)
    with BuildSketch(Plane(origin=(-11, 80, -24.127685957), x_dir=(0, 0.0274958766105877, -0.9996219169112968), z_dir=(1, 0, 0))) as chamfer1_piece_11b_section:
        with BuildLine():
            Line((5.143365976, 0), (-0.282735774, -5.135588968))
            Line((-0.282735774, -5.135588968), (-0.382697966, -5.13283938))
            ThreePointArc((-0.382697966, -5.13283938), (-0.170646135, -2.566989148), (-0.099962192, 0.002749588))
            Line((-0.099962192, 0.002749588), (0.002749588, 0.099962192))
            ThreePointArc((0.002749588, 0.099962192), (2.572488324, 0.029278248), (5.146115564, 0.099962192))
            Line((5.146115564, 0.099962192), (5.143365976, 0))
        make_face()
    chamfer1_piece_11b = extrude(amount=35.85841494, mode=Mode.PRIVATE)
    chamfer1_piece_11b = split(chamfer1_piece_11b, bisect_by=Plane(origin=(12, 78.351031866, -25.776654091), z_dir=(1, 0, 0)), keep=Keep.TOP, mode=Mode.PRIVATE)
    chamfer1_piece_11 = chamfer1_piece_11a & chamfer1_piece_11b
    add(chamfer1_piece_11, mode=Mode.SUBTRACT)
    with BuildSketch(Plane(origin=(-50, 80, -5), x_dir=(-0.027495876610586282, -0.9996219169112968, 0), z_dir=(0, 0, 1))) as chamfer1_piece_12a_section:
        with BuildLine():
            Line((5.143365976, 0), (-0.282735774, 5.135588968))
            Line((-0.282735774, 5.135588968), (-0.382697966, 5.13283938))
            ThreePointArc((-0.382697966, 5.13283938), (-0.170646135, 2.566989148), (-0.099962192, -0.002749588))
            Line((-0.099962192, -0.002749588), (0.002749588, -0.099962192))
            ThreePointArc((0.002749588, -0.099962192), (2.572488324, -0.029278248), (5.146115564, -0.099962192))
            Line((5.146115564, -0.099962192), (5.143365976, 0))
        make_face()
    chamfer1_piece_12a = extrude(amount=37.85841494, mode=Mode.PRIVATE)
    chamfer1_piece_12a = split(chamfer1_piece_12a, bisect_by=Plane(origin=(-48.351031866, 78.351031866, 20), z_dir=(0, 0, 1)), keep=Keep.TOP, mode=Mode.PRIVATE)
    with BuildSketch(Plane(origin=(-62.85841494, 80, 20), x_dir=(0, -0.9996219169112968, 0.027495876610586282), z_dir=(1, 0, 0))) as chamfer1_piece_12b_section:
        with BuildLine():
            Line((5.143365976, 0), (-0.282735774, 5.135588968))
            Line((-0.282735774, 5.135588968), (-0.382697966, 5.13283938))
            ThreePointArc((-0.382697966, 5.13283938), (-0.170646135, 2.566989148), (-0.099962192, -0.002749588))
            Line((-0.099962192, -0.002749588), (0.002749588, -0.099962192))
            ThreePointArc((0.002749588, -0.099962192), (2.572488324, -0.029278248), (5.146115564, -0.099962192))
            Line((5.146115564, -0.099962192), (5.143365976, 0))
        make_face()
    chamfer1_piece_12b = extrude(amount=112.85841494, mode=Mode.PRIVATE)
    chamfer1_piece_12b = split(chamfer1_piece_12b, bisect_by=Plane(origin=(-50, 78.351031866, 18.351031866), z_dir=(-1, 0, 0)), keep=Keep.TOP, mode=Mode.PRIVATE)
    chamfer1_piece_12 = chamfer1_piece_12a & chamfer1_piece_12b
    add(chamfer1_piece_12, mode=Mode.SUBTRACT)
    with BuildSketch(Plane(origin=(-50, 80, 20), x_dir=(0, -0.9996219169112968, 0.027495876610586282), z_dir=(1, 0, 0))) as chamfer1_piece_13a_section:
        with BuildLine():
            Line((5.143365976, 0), (-0.282735774, 5.135588968))
            Line((-0.282735774, 5.135588968), (-0.382697966, 5.13283938))
            ThreePointArc((-0.382697966, 5.13283938), (-0.170646135, 2.566989148), (-0.099962192, -0.002749588))
            Line((-0.099962192, -0.002749588), (0.002749588, -0.099962192))
            ThreePointArc((0.002749588, -0.099962192), (2.572488324, -0.029278248), (5.146115564, -0.099962192))
            Line((5.146115564, -0.099962192), (5.143365976, 0))
        make_face()
    chamfer1_piece_13a = extrude(amount=112.85841494, mode=Mode.PRIVATE)
    chamfer1_piece_13a = split(chamfer1_piece_13a, bisect_by=Plane(origin=(50, 78.351031866, 18.351031866), z_dir=(1, 0, 0)), keep=Keep.TOP, mode=Mode.PRIVATE)
    with BuildSketch(Plane(origin=(50, 80, 32.85841494), x_dir=(-0.9996219169112968, 0.0274958766105877, 0), z_dir=(0, 0, -1))) as chamfer1_piece_13b_section:
        with BuildLine():
            Line((5.143365976, 0), (-0.282735774, -5.135588968))
            Line((-0.282735774, -5.135588968), (-0.382697966, -5.13283938))
            ThreePointArc((-0.382697966, -5.13283938), (-0.170646135, -2.566989148), (-0.099962192, 0.002749588))
            Line((-0.099962192, 0.002749588), (0.002749588, 0.099962192))
            ThreePointArc((0.002749588, 0.099962192), (2.572488324, 0.029278248), (5.146115564, 0.099962192))
            Line((5.146115564, 0.099962192), (5.143365976, 0))
        make_face()
    chamfer1_piece_13b = extrude(amount=37.85841494, mode=Mode.PRIVATE)
    chamfer1_piece_13b = split(chamfer1_piece_13b, bisect_by=Plane(origin=(48.351031866, 78.351031866, 20), z_dir=(0, 0, 1)), keep=Keep.TOP, mode=Mode.PRIVATE)
    chamfer1_piece_13 = chamfer1_piece_13a & chamfer1_piece_13b
    add(chamfer1_piece_13, mode=Mode.SUBTRACT)

    # Sketch26 → Boss-Extrude8 (add)
    with BuildSketch(Plane.XY.offset(1)):
        with Locations((-4.083795183, -51.343072006)):
            Rectangle(SKETCH26_W, SKETCH26_H)
    extrude(amount=BOSS_EXTRUDE8_DEPTH)

    # Sketch27 → Cut-Extrude13 (cut)
    with BuildSketch(Plane.XZ.offset(80)):
        with Locations(Location((0, 2.5, 0), (0, 0, 270))):
            Circle(SKETCH27_R)
        with Locations(Location((-25, 2.5, 0), (0, 0, 270))):
            Circle(SKETCH27_R)
        with Locations(Location((25, 2.5, 0), (0, 0, 270))):
            Circle(SKETCH27_R)
    extrude(amount=-CUT_EXTRUDE13_DEPTH, mode=Mode.SUBTRACT)

    # Sketch28 → Cut-Extrude14 (cut)
    with BuildSketch(Plane(origin=(0, 80, 0), x_dir=(1, 0, 0), z_dir=(0, 1, 0))):
        with Locations(Location((0, -9.853450589, 0), (0, 0, 270))):
            Circle(SKETCH28_R)
    extrude(amount=-CUT_EXTRUDE14_DEPTH, mode=Mode.SUBTRACT)

    # Sketch14 → Cut-Extrude15 (cut)
    with BuildSketch(Plane(origin=(50, 0, 0), x_dir=(0, 0, -1), z_dir=(1, 0, 0))):
        with Locations(Location((0, -52.197110406, 0), (0, 0, 299.353470055))):
            Circle(SKETCH14_R)
        with Locations(Location((0, 52.197110406, 0), (0, 0, 60.646529945))):
            Circle(SKETCH14_R)
    extrude(amount=-CUT_EXTRUDE15_DEPTH, mode=Mode.SUBTRACT)

    # Sketch17 → Cut-Extrude16 (cut)
    with BuildSketch(Plane.ZY.offset(50)):
        with Locations(Location((0, -52.165272983, 0), (0, 0, 293.088772437))):
            Circle(SKETCH17_R)
        with Locations(Location((0, 52.165272983, 0), (0, 0, 275.626270946))):
            Circle(SKETCH17_R)
    extrude(amount=-CUT_EXTRUDE16_DEPTH, mode=Mode.SUBTRACT)


with BuildPart() as body_2:
    # Sketch22 → Boss-Extrude7 (new body)
    with BuildSketch(Plane.XY.offset(1)):
        with Locations((-33.819006912, -0.086877249)):
            Rectangle(SKETCH22_W, SKETCH22_H)
    extrude(amount=BOSS_EXTRUDE7_DEPTH)

    # Sketch23 → Cut-Extrude17 (cut)
    with BuildSketch(Plane(origin=(-22.546004608, 0, 0), x_dir=(0, 0, -1), z_dir=(1, 0, 0))):
        with Locations((-9.070275609, -0.09965853)):
            Rectangle(SKETCH23_W, SKETCH23_H)
    extrude(amount=-CUT_EXTRUDE17_DEPTH, mode=Mode.SUBTRACT)


with BuildPart() as body_3:
    # Sketch22 → Boss-Extrude7 2 (new body)
    with BuildSketch(Plane.XY.offset(1)):
        with Locations((33.819006912, -0.086877249)):
            Rectangle(SKETCH22_W, SKETCH22_H)
    extrude(amount=BOSS_EXTRUDE7_2_DEPTH)

    # Sketch24 → Cut-Extrude18 (cut)
    with BuildSketch(Plane.ZY.offset(-22.546004608)):
        with Locations((9.143154752, 0.150993818)):
            Rectangle(SKETCH24_W, SKETCH24_H)
    extrude(amount=-CUT_EXTRUDE18_DEPTH, mode=Mode.SUBTRACT)


solid = Compound([part.part, body_2.part, body_3.part])
